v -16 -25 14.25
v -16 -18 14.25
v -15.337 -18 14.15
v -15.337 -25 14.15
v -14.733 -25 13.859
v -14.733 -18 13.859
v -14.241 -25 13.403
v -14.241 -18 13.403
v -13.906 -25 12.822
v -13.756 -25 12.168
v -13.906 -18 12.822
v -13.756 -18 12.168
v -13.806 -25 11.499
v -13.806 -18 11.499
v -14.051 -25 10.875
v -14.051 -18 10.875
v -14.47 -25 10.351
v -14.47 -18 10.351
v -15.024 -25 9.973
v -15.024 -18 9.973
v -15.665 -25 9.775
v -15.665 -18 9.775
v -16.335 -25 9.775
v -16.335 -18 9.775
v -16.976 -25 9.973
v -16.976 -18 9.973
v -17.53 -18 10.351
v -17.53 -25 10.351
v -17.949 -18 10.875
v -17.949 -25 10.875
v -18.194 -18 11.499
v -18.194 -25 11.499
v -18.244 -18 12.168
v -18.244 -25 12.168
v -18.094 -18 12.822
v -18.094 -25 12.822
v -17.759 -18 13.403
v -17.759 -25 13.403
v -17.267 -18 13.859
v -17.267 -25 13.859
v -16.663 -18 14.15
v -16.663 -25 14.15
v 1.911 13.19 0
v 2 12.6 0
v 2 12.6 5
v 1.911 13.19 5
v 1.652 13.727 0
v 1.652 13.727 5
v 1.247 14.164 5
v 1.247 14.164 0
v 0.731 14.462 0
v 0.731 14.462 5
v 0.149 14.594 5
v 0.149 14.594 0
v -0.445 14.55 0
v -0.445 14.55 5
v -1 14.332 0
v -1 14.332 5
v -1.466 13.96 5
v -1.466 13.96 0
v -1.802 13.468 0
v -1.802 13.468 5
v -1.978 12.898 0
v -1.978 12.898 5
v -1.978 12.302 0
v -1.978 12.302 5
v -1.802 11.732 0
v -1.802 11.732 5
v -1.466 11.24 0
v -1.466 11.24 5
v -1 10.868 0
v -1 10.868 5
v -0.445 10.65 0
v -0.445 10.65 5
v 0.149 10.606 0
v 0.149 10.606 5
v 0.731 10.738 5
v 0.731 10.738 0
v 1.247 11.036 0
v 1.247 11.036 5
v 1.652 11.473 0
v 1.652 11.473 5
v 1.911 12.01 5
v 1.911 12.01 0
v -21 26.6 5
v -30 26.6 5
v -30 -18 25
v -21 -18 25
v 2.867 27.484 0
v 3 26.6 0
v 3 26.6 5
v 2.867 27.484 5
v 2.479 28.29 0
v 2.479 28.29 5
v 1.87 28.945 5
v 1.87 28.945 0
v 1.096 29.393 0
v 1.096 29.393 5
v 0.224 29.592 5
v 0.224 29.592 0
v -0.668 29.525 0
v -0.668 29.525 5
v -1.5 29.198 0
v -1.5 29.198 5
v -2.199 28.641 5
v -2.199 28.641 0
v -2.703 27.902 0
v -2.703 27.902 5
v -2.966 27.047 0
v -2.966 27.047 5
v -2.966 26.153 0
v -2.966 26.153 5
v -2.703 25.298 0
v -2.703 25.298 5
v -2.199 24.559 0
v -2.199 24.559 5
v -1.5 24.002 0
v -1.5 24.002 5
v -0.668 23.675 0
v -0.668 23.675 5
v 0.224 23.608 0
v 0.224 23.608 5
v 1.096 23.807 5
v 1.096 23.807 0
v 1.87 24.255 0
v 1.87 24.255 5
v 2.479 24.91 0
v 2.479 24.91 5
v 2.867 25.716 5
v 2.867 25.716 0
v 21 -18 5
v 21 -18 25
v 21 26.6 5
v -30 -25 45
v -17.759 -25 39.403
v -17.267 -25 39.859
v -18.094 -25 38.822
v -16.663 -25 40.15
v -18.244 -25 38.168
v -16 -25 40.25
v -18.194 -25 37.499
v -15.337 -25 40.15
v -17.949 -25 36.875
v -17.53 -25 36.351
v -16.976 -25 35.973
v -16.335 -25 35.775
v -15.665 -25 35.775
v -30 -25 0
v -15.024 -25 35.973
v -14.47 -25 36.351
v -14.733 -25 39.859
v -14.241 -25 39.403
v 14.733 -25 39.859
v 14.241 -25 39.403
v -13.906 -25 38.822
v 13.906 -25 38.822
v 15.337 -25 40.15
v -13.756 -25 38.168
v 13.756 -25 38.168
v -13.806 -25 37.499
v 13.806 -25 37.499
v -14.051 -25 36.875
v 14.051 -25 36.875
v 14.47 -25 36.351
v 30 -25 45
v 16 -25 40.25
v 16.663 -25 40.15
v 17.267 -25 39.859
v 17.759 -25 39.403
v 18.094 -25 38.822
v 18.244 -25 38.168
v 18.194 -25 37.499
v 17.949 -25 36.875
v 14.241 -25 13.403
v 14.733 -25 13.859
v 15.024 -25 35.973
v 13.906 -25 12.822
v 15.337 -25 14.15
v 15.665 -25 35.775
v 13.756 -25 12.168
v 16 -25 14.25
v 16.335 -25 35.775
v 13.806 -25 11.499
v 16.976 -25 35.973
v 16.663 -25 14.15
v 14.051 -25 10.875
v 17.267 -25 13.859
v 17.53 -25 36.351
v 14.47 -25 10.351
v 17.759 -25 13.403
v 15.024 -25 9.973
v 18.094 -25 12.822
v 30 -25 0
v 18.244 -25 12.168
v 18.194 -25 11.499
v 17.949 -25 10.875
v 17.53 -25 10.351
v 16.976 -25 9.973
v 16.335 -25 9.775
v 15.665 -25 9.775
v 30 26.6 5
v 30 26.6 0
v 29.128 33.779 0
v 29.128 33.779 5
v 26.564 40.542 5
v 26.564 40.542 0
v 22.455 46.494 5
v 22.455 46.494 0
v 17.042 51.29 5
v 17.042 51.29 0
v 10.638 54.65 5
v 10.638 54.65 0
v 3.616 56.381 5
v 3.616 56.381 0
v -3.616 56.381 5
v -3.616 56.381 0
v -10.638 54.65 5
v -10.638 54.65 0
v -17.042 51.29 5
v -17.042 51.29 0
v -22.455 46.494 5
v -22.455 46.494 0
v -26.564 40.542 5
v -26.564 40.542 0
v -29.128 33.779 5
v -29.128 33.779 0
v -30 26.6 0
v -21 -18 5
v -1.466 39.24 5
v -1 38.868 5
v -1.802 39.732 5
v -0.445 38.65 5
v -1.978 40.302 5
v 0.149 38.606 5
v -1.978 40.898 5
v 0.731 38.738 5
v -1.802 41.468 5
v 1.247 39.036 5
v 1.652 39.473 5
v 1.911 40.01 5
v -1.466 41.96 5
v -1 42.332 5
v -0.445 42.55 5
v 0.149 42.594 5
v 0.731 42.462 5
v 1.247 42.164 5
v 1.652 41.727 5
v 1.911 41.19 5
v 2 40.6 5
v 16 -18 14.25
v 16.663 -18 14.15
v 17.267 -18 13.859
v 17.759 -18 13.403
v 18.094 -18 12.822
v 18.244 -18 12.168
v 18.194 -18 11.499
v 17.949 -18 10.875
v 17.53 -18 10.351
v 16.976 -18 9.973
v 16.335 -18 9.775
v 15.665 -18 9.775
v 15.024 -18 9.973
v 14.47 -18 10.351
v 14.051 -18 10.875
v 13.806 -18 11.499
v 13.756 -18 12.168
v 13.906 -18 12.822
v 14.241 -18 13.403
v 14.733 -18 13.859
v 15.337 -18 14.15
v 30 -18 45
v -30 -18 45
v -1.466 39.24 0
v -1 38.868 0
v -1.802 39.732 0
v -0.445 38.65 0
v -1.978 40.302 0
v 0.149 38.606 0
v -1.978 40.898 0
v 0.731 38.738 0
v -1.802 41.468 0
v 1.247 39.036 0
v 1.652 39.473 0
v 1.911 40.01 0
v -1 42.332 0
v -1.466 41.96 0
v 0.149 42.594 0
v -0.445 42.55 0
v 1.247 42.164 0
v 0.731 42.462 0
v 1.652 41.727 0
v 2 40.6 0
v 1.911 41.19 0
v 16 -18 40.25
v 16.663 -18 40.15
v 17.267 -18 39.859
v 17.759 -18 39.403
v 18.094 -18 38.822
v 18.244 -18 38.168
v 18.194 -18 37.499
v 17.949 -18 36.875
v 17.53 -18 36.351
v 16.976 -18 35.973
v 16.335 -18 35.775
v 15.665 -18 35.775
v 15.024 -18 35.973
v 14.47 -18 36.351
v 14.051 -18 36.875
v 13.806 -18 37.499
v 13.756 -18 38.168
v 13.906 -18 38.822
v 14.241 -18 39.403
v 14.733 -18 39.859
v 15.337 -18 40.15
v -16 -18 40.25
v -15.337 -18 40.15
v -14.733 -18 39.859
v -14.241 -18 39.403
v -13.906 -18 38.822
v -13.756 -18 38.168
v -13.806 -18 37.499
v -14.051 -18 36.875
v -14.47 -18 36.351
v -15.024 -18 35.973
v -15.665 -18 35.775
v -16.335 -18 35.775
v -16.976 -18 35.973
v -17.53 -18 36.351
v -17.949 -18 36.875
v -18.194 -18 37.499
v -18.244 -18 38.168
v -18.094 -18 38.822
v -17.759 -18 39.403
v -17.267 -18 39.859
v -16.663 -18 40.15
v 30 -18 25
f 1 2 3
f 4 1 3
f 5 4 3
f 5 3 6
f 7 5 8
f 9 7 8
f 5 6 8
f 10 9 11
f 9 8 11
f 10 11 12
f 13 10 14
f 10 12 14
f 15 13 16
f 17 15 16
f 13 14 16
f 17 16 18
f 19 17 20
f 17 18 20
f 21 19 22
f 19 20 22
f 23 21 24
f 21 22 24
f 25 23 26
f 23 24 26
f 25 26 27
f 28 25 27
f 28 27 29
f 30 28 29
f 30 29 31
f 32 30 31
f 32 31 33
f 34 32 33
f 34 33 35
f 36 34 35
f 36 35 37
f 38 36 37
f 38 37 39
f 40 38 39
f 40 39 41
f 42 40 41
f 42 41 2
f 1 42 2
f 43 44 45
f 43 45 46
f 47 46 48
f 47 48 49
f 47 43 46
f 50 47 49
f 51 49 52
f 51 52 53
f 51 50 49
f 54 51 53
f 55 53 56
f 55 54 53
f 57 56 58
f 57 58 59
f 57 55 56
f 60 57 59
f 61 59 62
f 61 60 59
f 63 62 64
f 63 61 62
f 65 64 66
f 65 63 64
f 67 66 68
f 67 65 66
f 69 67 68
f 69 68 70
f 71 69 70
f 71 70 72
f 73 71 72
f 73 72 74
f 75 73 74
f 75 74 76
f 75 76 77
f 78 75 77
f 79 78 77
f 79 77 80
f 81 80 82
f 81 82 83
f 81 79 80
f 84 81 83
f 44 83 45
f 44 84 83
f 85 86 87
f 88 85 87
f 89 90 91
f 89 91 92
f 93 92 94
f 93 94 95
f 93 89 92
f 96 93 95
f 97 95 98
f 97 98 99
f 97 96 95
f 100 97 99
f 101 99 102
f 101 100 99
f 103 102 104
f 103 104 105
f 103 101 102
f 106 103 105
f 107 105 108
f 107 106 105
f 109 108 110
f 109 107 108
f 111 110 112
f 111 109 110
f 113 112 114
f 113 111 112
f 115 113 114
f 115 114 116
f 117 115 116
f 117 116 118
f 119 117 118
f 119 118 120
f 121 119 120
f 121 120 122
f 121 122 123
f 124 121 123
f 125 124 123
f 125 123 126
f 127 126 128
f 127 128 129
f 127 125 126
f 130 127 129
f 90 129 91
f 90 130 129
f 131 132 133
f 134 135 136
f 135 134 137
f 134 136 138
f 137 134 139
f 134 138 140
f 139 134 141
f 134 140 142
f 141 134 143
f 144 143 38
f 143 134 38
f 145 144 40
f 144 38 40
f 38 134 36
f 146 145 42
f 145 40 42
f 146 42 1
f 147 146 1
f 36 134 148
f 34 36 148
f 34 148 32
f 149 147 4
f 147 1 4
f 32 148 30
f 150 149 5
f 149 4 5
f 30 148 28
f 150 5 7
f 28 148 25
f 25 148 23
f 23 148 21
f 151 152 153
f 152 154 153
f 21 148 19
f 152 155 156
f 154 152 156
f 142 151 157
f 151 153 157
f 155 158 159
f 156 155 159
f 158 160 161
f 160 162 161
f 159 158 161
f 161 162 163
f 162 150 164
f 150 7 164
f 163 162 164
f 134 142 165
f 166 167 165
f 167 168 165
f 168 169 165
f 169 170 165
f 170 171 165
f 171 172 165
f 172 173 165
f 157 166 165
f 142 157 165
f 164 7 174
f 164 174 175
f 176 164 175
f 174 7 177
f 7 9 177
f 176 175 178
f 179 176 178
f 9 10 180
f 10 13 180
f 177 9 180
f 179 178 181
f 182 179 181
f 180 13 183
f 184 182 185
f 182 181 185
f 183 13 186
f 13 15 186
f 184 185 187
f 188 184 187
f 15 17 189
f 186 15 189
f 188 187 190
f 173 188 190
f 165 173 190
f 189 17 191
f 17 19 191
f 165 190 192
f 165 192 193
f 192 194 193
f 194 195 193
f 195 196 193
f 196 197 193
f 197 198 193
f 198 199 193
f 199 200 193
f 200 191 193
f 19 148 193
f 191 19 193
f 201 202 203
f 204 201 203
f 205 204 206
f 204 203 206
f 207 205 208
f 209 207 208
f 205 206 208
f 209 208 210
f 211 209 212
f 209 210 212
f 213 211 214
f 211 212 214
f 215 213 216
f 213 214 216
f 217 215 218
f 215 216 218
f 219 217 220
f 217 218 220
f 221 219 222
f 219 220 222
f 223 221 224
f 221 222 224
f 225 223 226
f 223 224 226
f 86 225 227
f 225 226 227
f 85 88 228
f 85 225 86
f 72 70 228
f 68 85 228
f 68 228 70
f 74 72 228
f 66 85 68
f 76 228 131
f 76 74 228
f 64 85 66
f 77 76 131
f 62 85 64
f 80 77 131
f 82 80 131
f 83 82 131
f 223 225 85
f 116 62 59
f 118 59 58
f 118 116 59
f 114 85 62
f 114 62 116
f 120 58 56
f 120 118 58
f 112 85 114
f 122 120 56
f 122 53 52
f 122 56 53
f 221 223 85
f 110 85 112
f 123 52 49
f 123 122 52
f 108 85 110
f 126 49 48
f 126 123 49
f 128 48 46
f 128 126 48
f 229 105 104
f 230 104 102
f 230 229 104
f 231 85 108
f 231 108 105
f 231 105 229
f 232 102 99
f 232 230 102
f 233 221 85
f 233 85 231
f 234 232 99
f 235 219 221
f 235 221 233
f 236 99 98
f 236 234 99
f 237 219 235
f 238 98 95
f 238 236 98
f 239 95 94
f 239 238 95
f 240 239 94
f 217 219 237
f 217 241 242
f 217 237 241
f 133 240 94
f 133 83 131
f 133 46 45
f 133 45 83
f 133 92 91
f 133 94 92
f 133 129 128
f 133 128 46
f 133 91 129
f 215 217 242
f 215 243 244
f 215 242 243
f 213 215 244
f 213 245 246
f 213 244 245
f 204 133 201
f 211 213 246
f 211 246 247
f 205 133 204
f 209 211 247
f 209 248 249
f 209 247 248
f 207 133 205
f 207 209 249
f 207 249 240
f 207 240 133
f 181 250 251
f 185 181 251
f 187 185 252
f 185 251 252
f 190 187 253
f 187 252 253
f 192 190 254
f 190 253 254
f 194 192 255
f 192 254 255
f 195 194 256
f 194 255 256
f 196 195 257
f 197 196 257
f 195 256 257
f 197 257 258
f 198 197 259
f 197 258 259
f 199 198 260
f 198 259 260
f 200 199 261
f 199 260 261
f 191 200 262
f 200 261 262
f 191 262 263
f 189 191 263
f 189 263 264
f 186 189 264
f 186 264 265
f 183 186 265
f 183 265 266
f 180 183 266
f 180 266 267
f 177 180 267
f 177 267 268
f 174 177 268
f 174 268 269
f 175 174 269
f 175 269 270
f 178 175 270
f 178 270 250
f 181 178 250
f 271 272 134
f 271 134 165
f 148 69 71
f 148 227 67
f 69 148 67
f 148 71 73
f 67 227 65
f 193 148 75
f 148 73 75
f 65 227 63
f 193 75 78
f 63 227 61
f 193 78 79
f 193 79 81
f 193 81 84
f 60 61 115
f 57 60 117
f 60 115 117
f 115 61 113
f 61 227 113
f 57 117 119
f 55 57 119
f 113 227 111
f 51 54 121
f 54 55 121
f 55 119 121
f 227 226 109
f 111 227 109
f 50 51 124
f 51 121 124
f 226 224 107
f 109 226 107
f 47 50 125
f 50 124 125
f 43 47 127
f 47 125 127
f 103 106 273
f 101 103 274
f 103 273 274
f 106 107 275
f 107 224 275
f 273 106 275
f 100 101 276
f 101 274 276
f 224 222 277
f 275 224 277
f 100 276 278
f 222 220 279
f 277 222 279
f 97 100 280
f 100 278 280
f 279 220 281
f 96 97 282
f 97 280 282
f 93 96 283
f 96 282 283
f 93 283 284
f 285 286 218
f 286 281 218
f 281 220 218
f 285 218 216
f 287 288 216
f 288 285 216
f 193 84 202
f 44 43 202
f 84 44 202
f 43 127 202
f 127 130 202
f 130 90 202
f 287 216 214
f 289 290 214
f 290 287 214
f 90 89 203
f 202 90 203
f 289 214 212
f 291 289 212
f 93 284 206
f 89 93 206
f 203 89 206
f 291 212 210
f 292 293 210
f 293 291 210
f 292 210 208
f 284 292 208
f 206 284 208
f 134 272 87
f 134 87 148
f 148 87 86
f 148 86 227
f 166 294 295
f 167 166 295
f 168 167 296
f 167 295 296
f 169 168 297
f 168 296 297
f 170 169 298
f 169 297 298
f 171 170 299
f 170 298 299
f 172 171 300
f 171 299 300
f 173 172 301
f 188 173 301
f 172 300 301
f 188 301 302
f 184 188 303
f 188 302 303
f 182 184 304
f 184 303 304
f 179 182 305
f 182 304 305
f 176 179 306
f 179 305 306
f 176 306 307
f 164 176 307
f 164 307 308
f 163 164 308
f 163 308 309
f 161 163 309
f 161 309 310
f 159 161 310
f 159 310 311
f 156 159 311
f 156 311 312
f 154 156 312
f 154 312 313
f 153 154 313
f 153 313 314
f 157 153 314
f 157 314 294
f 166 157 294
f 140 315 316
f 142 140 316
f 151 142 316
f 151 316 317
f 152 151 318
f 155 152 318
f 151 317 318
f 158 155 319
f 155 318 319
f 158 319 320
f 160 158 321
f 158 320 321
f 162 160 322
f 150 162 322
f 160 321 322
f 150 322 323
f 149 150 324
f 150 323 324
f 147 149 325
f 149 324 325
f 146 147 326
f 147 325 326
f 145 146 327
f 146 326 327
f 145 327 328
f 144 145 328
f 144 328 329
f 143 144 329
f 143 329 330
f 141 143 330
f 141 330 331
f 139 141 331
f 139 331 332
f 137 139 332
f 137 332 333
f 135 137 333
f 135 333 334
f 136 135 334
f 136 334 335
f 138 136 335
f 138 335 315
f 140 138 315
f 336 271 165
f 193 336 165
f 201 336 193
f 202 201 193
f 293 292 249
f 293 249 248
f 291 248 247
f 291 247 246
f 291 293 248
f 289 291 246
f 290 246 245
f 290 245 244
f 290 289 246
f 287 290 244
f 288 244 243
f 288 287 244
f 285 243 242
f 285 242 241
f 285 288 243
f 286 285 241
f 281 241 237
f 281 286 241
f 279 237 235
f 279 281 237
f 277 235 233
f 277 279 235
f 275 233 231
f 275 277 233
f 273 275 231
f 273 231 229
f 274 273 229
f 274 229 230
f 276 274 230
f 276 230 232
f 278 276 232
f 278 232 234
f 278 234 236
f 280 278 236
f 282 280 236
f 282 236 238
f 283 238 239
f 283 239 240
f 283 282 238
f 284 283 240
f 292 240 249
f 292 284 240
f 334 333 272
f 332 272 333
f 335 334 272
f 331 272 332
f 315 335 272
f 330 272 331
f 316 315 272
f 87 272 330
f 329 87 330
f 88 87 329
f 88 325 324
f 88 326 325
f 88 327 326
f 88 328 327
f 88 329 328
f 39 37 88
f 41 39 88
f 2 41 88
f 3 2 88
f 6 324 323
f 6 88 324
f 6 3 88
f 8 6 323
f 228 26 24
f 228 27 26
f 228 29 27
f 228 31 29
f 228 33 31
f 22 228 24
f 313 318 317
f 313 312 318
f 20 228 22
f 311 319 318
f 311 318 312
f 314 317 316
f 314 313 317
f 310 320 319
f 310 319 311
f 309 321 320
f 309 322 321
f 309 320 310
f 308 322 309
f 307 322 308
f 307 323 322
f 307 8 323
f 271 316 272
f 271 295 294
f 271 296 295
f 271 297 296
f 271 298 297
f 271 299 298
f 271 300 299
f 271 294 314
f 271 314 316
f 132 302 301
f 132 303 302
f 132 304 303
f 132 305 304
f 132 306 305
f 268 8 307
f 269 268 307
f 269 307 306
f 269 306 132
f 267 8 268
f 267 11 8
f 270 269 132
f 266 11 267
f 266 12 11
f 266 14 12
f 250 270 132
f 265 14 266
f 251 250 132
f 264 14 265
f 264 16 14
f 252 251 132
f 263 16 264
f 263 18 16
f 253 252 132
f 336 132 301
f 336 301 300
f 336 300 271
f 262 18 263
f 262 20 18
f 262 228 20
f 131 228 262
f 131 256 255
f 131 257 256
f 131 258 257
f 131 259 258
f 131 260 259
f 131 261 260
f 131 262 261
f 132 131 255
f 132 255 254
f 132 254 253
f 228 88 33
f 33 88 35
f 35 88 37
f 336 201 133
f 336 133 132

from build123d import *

# Parameters (mm, degrees)
SKETCH1_R           = 3
SKETCH1_R_2         = 2
BOSS_EXTRUDE1_DEPTH = 5
SKETCH2_W           = 60
SKETCH2_H           = 7
BOSS_EXTRUDE2_DEPTH = 40
BOSS_EXTRUDE3_DEPTH = 9
SKETCH4_R           = 2.25
CUT_EXTRUDE1_DEPTH  = 8


with BuildPart() as part:
    # Sketch1 → Boss-Extrude1 (new body)
    with BuildSketch(Plane.XY):
        with BuildLine():
            Line((-30, 26.6), (-30, -25))
            Line((-30, -25), (30, -25))
            Line((30, -25), (30, 26.6))
            ThreePointArc((30, 26.6), (0, 56.6), (-30, 26.6))
        make_face()
        with Locations((0, 26.6)):
            Circle(SKETCH1_R, mode=Mode.SUBTRACT)
        with Locations((0, 40.6)):
            Circle(SKETCH1_R_2, mode=Mode.SUBTRACT)
        with Locations((0, 12.6)):
            Circle(SKETCH1_R_2, mode=Mode.SUBTRACT)
    extrude(amount=BOSS_EXTRUDE1_DEPTH)

    # Sketch2 → Boss-Extrude2 (add)
    with BuildSketch(Plane.XY.offset(5)):
        with Locations((0, -21.5)):
            Rectangle(SKETCH2_W, SKETCH2_H)
    extrude(amount=BOSS_EXTRUDE2_DEPTH)

    # Sketch3 → Boss-Extrude3 (add)
    with BuildSketch(Plane.ZY.offset(30)):
        Polygon((5, 26.6), (25, -18), (5, -18), align=None)
    boss_extrude3 = extrude(amount=-BOSS_EXTRUDE3_DEPTH)

    # Mirror1: Boss-Extrude3 across plane
    add(boss_extrude3.mirror(Plane(origin=(0, 0, 0), x_dir=(0, 0, 1), z_dir=(1, 0, 0))))

    # Sketch4 → Cut-Extrude1 (cut, through all)
    with BuildSketch(Plane(origin=(0, -18, 0), x_dir=(1, 0, 0), z_dir=(0, 1, 0))):
        with Locations(Location((16, -38, 0), (0, 0, 270))):  # turned: the seam where the file's is
            Circle(SKETCH4_R)
        with Locations(Location((-16, -38, 0), (0, 0, 270))):  # turned: the seam where the file's is
            Circle(SKETCH4_R)
        with Locations(Location((-16, -12, 0), (0, 0, 270))):  # turned: the seam where the file's is
            Circle(SKETCH4_R)
        with Locations(Location((16, -12, 0), (0, 0, 270))):  # turned: the seam where the file's is
            Circle(SKETCH4_R)
    extrude(amount=-CUT_EXTRUDE1_DEPTH, mode=Mode.SUBTRACT)


solid = part.part
